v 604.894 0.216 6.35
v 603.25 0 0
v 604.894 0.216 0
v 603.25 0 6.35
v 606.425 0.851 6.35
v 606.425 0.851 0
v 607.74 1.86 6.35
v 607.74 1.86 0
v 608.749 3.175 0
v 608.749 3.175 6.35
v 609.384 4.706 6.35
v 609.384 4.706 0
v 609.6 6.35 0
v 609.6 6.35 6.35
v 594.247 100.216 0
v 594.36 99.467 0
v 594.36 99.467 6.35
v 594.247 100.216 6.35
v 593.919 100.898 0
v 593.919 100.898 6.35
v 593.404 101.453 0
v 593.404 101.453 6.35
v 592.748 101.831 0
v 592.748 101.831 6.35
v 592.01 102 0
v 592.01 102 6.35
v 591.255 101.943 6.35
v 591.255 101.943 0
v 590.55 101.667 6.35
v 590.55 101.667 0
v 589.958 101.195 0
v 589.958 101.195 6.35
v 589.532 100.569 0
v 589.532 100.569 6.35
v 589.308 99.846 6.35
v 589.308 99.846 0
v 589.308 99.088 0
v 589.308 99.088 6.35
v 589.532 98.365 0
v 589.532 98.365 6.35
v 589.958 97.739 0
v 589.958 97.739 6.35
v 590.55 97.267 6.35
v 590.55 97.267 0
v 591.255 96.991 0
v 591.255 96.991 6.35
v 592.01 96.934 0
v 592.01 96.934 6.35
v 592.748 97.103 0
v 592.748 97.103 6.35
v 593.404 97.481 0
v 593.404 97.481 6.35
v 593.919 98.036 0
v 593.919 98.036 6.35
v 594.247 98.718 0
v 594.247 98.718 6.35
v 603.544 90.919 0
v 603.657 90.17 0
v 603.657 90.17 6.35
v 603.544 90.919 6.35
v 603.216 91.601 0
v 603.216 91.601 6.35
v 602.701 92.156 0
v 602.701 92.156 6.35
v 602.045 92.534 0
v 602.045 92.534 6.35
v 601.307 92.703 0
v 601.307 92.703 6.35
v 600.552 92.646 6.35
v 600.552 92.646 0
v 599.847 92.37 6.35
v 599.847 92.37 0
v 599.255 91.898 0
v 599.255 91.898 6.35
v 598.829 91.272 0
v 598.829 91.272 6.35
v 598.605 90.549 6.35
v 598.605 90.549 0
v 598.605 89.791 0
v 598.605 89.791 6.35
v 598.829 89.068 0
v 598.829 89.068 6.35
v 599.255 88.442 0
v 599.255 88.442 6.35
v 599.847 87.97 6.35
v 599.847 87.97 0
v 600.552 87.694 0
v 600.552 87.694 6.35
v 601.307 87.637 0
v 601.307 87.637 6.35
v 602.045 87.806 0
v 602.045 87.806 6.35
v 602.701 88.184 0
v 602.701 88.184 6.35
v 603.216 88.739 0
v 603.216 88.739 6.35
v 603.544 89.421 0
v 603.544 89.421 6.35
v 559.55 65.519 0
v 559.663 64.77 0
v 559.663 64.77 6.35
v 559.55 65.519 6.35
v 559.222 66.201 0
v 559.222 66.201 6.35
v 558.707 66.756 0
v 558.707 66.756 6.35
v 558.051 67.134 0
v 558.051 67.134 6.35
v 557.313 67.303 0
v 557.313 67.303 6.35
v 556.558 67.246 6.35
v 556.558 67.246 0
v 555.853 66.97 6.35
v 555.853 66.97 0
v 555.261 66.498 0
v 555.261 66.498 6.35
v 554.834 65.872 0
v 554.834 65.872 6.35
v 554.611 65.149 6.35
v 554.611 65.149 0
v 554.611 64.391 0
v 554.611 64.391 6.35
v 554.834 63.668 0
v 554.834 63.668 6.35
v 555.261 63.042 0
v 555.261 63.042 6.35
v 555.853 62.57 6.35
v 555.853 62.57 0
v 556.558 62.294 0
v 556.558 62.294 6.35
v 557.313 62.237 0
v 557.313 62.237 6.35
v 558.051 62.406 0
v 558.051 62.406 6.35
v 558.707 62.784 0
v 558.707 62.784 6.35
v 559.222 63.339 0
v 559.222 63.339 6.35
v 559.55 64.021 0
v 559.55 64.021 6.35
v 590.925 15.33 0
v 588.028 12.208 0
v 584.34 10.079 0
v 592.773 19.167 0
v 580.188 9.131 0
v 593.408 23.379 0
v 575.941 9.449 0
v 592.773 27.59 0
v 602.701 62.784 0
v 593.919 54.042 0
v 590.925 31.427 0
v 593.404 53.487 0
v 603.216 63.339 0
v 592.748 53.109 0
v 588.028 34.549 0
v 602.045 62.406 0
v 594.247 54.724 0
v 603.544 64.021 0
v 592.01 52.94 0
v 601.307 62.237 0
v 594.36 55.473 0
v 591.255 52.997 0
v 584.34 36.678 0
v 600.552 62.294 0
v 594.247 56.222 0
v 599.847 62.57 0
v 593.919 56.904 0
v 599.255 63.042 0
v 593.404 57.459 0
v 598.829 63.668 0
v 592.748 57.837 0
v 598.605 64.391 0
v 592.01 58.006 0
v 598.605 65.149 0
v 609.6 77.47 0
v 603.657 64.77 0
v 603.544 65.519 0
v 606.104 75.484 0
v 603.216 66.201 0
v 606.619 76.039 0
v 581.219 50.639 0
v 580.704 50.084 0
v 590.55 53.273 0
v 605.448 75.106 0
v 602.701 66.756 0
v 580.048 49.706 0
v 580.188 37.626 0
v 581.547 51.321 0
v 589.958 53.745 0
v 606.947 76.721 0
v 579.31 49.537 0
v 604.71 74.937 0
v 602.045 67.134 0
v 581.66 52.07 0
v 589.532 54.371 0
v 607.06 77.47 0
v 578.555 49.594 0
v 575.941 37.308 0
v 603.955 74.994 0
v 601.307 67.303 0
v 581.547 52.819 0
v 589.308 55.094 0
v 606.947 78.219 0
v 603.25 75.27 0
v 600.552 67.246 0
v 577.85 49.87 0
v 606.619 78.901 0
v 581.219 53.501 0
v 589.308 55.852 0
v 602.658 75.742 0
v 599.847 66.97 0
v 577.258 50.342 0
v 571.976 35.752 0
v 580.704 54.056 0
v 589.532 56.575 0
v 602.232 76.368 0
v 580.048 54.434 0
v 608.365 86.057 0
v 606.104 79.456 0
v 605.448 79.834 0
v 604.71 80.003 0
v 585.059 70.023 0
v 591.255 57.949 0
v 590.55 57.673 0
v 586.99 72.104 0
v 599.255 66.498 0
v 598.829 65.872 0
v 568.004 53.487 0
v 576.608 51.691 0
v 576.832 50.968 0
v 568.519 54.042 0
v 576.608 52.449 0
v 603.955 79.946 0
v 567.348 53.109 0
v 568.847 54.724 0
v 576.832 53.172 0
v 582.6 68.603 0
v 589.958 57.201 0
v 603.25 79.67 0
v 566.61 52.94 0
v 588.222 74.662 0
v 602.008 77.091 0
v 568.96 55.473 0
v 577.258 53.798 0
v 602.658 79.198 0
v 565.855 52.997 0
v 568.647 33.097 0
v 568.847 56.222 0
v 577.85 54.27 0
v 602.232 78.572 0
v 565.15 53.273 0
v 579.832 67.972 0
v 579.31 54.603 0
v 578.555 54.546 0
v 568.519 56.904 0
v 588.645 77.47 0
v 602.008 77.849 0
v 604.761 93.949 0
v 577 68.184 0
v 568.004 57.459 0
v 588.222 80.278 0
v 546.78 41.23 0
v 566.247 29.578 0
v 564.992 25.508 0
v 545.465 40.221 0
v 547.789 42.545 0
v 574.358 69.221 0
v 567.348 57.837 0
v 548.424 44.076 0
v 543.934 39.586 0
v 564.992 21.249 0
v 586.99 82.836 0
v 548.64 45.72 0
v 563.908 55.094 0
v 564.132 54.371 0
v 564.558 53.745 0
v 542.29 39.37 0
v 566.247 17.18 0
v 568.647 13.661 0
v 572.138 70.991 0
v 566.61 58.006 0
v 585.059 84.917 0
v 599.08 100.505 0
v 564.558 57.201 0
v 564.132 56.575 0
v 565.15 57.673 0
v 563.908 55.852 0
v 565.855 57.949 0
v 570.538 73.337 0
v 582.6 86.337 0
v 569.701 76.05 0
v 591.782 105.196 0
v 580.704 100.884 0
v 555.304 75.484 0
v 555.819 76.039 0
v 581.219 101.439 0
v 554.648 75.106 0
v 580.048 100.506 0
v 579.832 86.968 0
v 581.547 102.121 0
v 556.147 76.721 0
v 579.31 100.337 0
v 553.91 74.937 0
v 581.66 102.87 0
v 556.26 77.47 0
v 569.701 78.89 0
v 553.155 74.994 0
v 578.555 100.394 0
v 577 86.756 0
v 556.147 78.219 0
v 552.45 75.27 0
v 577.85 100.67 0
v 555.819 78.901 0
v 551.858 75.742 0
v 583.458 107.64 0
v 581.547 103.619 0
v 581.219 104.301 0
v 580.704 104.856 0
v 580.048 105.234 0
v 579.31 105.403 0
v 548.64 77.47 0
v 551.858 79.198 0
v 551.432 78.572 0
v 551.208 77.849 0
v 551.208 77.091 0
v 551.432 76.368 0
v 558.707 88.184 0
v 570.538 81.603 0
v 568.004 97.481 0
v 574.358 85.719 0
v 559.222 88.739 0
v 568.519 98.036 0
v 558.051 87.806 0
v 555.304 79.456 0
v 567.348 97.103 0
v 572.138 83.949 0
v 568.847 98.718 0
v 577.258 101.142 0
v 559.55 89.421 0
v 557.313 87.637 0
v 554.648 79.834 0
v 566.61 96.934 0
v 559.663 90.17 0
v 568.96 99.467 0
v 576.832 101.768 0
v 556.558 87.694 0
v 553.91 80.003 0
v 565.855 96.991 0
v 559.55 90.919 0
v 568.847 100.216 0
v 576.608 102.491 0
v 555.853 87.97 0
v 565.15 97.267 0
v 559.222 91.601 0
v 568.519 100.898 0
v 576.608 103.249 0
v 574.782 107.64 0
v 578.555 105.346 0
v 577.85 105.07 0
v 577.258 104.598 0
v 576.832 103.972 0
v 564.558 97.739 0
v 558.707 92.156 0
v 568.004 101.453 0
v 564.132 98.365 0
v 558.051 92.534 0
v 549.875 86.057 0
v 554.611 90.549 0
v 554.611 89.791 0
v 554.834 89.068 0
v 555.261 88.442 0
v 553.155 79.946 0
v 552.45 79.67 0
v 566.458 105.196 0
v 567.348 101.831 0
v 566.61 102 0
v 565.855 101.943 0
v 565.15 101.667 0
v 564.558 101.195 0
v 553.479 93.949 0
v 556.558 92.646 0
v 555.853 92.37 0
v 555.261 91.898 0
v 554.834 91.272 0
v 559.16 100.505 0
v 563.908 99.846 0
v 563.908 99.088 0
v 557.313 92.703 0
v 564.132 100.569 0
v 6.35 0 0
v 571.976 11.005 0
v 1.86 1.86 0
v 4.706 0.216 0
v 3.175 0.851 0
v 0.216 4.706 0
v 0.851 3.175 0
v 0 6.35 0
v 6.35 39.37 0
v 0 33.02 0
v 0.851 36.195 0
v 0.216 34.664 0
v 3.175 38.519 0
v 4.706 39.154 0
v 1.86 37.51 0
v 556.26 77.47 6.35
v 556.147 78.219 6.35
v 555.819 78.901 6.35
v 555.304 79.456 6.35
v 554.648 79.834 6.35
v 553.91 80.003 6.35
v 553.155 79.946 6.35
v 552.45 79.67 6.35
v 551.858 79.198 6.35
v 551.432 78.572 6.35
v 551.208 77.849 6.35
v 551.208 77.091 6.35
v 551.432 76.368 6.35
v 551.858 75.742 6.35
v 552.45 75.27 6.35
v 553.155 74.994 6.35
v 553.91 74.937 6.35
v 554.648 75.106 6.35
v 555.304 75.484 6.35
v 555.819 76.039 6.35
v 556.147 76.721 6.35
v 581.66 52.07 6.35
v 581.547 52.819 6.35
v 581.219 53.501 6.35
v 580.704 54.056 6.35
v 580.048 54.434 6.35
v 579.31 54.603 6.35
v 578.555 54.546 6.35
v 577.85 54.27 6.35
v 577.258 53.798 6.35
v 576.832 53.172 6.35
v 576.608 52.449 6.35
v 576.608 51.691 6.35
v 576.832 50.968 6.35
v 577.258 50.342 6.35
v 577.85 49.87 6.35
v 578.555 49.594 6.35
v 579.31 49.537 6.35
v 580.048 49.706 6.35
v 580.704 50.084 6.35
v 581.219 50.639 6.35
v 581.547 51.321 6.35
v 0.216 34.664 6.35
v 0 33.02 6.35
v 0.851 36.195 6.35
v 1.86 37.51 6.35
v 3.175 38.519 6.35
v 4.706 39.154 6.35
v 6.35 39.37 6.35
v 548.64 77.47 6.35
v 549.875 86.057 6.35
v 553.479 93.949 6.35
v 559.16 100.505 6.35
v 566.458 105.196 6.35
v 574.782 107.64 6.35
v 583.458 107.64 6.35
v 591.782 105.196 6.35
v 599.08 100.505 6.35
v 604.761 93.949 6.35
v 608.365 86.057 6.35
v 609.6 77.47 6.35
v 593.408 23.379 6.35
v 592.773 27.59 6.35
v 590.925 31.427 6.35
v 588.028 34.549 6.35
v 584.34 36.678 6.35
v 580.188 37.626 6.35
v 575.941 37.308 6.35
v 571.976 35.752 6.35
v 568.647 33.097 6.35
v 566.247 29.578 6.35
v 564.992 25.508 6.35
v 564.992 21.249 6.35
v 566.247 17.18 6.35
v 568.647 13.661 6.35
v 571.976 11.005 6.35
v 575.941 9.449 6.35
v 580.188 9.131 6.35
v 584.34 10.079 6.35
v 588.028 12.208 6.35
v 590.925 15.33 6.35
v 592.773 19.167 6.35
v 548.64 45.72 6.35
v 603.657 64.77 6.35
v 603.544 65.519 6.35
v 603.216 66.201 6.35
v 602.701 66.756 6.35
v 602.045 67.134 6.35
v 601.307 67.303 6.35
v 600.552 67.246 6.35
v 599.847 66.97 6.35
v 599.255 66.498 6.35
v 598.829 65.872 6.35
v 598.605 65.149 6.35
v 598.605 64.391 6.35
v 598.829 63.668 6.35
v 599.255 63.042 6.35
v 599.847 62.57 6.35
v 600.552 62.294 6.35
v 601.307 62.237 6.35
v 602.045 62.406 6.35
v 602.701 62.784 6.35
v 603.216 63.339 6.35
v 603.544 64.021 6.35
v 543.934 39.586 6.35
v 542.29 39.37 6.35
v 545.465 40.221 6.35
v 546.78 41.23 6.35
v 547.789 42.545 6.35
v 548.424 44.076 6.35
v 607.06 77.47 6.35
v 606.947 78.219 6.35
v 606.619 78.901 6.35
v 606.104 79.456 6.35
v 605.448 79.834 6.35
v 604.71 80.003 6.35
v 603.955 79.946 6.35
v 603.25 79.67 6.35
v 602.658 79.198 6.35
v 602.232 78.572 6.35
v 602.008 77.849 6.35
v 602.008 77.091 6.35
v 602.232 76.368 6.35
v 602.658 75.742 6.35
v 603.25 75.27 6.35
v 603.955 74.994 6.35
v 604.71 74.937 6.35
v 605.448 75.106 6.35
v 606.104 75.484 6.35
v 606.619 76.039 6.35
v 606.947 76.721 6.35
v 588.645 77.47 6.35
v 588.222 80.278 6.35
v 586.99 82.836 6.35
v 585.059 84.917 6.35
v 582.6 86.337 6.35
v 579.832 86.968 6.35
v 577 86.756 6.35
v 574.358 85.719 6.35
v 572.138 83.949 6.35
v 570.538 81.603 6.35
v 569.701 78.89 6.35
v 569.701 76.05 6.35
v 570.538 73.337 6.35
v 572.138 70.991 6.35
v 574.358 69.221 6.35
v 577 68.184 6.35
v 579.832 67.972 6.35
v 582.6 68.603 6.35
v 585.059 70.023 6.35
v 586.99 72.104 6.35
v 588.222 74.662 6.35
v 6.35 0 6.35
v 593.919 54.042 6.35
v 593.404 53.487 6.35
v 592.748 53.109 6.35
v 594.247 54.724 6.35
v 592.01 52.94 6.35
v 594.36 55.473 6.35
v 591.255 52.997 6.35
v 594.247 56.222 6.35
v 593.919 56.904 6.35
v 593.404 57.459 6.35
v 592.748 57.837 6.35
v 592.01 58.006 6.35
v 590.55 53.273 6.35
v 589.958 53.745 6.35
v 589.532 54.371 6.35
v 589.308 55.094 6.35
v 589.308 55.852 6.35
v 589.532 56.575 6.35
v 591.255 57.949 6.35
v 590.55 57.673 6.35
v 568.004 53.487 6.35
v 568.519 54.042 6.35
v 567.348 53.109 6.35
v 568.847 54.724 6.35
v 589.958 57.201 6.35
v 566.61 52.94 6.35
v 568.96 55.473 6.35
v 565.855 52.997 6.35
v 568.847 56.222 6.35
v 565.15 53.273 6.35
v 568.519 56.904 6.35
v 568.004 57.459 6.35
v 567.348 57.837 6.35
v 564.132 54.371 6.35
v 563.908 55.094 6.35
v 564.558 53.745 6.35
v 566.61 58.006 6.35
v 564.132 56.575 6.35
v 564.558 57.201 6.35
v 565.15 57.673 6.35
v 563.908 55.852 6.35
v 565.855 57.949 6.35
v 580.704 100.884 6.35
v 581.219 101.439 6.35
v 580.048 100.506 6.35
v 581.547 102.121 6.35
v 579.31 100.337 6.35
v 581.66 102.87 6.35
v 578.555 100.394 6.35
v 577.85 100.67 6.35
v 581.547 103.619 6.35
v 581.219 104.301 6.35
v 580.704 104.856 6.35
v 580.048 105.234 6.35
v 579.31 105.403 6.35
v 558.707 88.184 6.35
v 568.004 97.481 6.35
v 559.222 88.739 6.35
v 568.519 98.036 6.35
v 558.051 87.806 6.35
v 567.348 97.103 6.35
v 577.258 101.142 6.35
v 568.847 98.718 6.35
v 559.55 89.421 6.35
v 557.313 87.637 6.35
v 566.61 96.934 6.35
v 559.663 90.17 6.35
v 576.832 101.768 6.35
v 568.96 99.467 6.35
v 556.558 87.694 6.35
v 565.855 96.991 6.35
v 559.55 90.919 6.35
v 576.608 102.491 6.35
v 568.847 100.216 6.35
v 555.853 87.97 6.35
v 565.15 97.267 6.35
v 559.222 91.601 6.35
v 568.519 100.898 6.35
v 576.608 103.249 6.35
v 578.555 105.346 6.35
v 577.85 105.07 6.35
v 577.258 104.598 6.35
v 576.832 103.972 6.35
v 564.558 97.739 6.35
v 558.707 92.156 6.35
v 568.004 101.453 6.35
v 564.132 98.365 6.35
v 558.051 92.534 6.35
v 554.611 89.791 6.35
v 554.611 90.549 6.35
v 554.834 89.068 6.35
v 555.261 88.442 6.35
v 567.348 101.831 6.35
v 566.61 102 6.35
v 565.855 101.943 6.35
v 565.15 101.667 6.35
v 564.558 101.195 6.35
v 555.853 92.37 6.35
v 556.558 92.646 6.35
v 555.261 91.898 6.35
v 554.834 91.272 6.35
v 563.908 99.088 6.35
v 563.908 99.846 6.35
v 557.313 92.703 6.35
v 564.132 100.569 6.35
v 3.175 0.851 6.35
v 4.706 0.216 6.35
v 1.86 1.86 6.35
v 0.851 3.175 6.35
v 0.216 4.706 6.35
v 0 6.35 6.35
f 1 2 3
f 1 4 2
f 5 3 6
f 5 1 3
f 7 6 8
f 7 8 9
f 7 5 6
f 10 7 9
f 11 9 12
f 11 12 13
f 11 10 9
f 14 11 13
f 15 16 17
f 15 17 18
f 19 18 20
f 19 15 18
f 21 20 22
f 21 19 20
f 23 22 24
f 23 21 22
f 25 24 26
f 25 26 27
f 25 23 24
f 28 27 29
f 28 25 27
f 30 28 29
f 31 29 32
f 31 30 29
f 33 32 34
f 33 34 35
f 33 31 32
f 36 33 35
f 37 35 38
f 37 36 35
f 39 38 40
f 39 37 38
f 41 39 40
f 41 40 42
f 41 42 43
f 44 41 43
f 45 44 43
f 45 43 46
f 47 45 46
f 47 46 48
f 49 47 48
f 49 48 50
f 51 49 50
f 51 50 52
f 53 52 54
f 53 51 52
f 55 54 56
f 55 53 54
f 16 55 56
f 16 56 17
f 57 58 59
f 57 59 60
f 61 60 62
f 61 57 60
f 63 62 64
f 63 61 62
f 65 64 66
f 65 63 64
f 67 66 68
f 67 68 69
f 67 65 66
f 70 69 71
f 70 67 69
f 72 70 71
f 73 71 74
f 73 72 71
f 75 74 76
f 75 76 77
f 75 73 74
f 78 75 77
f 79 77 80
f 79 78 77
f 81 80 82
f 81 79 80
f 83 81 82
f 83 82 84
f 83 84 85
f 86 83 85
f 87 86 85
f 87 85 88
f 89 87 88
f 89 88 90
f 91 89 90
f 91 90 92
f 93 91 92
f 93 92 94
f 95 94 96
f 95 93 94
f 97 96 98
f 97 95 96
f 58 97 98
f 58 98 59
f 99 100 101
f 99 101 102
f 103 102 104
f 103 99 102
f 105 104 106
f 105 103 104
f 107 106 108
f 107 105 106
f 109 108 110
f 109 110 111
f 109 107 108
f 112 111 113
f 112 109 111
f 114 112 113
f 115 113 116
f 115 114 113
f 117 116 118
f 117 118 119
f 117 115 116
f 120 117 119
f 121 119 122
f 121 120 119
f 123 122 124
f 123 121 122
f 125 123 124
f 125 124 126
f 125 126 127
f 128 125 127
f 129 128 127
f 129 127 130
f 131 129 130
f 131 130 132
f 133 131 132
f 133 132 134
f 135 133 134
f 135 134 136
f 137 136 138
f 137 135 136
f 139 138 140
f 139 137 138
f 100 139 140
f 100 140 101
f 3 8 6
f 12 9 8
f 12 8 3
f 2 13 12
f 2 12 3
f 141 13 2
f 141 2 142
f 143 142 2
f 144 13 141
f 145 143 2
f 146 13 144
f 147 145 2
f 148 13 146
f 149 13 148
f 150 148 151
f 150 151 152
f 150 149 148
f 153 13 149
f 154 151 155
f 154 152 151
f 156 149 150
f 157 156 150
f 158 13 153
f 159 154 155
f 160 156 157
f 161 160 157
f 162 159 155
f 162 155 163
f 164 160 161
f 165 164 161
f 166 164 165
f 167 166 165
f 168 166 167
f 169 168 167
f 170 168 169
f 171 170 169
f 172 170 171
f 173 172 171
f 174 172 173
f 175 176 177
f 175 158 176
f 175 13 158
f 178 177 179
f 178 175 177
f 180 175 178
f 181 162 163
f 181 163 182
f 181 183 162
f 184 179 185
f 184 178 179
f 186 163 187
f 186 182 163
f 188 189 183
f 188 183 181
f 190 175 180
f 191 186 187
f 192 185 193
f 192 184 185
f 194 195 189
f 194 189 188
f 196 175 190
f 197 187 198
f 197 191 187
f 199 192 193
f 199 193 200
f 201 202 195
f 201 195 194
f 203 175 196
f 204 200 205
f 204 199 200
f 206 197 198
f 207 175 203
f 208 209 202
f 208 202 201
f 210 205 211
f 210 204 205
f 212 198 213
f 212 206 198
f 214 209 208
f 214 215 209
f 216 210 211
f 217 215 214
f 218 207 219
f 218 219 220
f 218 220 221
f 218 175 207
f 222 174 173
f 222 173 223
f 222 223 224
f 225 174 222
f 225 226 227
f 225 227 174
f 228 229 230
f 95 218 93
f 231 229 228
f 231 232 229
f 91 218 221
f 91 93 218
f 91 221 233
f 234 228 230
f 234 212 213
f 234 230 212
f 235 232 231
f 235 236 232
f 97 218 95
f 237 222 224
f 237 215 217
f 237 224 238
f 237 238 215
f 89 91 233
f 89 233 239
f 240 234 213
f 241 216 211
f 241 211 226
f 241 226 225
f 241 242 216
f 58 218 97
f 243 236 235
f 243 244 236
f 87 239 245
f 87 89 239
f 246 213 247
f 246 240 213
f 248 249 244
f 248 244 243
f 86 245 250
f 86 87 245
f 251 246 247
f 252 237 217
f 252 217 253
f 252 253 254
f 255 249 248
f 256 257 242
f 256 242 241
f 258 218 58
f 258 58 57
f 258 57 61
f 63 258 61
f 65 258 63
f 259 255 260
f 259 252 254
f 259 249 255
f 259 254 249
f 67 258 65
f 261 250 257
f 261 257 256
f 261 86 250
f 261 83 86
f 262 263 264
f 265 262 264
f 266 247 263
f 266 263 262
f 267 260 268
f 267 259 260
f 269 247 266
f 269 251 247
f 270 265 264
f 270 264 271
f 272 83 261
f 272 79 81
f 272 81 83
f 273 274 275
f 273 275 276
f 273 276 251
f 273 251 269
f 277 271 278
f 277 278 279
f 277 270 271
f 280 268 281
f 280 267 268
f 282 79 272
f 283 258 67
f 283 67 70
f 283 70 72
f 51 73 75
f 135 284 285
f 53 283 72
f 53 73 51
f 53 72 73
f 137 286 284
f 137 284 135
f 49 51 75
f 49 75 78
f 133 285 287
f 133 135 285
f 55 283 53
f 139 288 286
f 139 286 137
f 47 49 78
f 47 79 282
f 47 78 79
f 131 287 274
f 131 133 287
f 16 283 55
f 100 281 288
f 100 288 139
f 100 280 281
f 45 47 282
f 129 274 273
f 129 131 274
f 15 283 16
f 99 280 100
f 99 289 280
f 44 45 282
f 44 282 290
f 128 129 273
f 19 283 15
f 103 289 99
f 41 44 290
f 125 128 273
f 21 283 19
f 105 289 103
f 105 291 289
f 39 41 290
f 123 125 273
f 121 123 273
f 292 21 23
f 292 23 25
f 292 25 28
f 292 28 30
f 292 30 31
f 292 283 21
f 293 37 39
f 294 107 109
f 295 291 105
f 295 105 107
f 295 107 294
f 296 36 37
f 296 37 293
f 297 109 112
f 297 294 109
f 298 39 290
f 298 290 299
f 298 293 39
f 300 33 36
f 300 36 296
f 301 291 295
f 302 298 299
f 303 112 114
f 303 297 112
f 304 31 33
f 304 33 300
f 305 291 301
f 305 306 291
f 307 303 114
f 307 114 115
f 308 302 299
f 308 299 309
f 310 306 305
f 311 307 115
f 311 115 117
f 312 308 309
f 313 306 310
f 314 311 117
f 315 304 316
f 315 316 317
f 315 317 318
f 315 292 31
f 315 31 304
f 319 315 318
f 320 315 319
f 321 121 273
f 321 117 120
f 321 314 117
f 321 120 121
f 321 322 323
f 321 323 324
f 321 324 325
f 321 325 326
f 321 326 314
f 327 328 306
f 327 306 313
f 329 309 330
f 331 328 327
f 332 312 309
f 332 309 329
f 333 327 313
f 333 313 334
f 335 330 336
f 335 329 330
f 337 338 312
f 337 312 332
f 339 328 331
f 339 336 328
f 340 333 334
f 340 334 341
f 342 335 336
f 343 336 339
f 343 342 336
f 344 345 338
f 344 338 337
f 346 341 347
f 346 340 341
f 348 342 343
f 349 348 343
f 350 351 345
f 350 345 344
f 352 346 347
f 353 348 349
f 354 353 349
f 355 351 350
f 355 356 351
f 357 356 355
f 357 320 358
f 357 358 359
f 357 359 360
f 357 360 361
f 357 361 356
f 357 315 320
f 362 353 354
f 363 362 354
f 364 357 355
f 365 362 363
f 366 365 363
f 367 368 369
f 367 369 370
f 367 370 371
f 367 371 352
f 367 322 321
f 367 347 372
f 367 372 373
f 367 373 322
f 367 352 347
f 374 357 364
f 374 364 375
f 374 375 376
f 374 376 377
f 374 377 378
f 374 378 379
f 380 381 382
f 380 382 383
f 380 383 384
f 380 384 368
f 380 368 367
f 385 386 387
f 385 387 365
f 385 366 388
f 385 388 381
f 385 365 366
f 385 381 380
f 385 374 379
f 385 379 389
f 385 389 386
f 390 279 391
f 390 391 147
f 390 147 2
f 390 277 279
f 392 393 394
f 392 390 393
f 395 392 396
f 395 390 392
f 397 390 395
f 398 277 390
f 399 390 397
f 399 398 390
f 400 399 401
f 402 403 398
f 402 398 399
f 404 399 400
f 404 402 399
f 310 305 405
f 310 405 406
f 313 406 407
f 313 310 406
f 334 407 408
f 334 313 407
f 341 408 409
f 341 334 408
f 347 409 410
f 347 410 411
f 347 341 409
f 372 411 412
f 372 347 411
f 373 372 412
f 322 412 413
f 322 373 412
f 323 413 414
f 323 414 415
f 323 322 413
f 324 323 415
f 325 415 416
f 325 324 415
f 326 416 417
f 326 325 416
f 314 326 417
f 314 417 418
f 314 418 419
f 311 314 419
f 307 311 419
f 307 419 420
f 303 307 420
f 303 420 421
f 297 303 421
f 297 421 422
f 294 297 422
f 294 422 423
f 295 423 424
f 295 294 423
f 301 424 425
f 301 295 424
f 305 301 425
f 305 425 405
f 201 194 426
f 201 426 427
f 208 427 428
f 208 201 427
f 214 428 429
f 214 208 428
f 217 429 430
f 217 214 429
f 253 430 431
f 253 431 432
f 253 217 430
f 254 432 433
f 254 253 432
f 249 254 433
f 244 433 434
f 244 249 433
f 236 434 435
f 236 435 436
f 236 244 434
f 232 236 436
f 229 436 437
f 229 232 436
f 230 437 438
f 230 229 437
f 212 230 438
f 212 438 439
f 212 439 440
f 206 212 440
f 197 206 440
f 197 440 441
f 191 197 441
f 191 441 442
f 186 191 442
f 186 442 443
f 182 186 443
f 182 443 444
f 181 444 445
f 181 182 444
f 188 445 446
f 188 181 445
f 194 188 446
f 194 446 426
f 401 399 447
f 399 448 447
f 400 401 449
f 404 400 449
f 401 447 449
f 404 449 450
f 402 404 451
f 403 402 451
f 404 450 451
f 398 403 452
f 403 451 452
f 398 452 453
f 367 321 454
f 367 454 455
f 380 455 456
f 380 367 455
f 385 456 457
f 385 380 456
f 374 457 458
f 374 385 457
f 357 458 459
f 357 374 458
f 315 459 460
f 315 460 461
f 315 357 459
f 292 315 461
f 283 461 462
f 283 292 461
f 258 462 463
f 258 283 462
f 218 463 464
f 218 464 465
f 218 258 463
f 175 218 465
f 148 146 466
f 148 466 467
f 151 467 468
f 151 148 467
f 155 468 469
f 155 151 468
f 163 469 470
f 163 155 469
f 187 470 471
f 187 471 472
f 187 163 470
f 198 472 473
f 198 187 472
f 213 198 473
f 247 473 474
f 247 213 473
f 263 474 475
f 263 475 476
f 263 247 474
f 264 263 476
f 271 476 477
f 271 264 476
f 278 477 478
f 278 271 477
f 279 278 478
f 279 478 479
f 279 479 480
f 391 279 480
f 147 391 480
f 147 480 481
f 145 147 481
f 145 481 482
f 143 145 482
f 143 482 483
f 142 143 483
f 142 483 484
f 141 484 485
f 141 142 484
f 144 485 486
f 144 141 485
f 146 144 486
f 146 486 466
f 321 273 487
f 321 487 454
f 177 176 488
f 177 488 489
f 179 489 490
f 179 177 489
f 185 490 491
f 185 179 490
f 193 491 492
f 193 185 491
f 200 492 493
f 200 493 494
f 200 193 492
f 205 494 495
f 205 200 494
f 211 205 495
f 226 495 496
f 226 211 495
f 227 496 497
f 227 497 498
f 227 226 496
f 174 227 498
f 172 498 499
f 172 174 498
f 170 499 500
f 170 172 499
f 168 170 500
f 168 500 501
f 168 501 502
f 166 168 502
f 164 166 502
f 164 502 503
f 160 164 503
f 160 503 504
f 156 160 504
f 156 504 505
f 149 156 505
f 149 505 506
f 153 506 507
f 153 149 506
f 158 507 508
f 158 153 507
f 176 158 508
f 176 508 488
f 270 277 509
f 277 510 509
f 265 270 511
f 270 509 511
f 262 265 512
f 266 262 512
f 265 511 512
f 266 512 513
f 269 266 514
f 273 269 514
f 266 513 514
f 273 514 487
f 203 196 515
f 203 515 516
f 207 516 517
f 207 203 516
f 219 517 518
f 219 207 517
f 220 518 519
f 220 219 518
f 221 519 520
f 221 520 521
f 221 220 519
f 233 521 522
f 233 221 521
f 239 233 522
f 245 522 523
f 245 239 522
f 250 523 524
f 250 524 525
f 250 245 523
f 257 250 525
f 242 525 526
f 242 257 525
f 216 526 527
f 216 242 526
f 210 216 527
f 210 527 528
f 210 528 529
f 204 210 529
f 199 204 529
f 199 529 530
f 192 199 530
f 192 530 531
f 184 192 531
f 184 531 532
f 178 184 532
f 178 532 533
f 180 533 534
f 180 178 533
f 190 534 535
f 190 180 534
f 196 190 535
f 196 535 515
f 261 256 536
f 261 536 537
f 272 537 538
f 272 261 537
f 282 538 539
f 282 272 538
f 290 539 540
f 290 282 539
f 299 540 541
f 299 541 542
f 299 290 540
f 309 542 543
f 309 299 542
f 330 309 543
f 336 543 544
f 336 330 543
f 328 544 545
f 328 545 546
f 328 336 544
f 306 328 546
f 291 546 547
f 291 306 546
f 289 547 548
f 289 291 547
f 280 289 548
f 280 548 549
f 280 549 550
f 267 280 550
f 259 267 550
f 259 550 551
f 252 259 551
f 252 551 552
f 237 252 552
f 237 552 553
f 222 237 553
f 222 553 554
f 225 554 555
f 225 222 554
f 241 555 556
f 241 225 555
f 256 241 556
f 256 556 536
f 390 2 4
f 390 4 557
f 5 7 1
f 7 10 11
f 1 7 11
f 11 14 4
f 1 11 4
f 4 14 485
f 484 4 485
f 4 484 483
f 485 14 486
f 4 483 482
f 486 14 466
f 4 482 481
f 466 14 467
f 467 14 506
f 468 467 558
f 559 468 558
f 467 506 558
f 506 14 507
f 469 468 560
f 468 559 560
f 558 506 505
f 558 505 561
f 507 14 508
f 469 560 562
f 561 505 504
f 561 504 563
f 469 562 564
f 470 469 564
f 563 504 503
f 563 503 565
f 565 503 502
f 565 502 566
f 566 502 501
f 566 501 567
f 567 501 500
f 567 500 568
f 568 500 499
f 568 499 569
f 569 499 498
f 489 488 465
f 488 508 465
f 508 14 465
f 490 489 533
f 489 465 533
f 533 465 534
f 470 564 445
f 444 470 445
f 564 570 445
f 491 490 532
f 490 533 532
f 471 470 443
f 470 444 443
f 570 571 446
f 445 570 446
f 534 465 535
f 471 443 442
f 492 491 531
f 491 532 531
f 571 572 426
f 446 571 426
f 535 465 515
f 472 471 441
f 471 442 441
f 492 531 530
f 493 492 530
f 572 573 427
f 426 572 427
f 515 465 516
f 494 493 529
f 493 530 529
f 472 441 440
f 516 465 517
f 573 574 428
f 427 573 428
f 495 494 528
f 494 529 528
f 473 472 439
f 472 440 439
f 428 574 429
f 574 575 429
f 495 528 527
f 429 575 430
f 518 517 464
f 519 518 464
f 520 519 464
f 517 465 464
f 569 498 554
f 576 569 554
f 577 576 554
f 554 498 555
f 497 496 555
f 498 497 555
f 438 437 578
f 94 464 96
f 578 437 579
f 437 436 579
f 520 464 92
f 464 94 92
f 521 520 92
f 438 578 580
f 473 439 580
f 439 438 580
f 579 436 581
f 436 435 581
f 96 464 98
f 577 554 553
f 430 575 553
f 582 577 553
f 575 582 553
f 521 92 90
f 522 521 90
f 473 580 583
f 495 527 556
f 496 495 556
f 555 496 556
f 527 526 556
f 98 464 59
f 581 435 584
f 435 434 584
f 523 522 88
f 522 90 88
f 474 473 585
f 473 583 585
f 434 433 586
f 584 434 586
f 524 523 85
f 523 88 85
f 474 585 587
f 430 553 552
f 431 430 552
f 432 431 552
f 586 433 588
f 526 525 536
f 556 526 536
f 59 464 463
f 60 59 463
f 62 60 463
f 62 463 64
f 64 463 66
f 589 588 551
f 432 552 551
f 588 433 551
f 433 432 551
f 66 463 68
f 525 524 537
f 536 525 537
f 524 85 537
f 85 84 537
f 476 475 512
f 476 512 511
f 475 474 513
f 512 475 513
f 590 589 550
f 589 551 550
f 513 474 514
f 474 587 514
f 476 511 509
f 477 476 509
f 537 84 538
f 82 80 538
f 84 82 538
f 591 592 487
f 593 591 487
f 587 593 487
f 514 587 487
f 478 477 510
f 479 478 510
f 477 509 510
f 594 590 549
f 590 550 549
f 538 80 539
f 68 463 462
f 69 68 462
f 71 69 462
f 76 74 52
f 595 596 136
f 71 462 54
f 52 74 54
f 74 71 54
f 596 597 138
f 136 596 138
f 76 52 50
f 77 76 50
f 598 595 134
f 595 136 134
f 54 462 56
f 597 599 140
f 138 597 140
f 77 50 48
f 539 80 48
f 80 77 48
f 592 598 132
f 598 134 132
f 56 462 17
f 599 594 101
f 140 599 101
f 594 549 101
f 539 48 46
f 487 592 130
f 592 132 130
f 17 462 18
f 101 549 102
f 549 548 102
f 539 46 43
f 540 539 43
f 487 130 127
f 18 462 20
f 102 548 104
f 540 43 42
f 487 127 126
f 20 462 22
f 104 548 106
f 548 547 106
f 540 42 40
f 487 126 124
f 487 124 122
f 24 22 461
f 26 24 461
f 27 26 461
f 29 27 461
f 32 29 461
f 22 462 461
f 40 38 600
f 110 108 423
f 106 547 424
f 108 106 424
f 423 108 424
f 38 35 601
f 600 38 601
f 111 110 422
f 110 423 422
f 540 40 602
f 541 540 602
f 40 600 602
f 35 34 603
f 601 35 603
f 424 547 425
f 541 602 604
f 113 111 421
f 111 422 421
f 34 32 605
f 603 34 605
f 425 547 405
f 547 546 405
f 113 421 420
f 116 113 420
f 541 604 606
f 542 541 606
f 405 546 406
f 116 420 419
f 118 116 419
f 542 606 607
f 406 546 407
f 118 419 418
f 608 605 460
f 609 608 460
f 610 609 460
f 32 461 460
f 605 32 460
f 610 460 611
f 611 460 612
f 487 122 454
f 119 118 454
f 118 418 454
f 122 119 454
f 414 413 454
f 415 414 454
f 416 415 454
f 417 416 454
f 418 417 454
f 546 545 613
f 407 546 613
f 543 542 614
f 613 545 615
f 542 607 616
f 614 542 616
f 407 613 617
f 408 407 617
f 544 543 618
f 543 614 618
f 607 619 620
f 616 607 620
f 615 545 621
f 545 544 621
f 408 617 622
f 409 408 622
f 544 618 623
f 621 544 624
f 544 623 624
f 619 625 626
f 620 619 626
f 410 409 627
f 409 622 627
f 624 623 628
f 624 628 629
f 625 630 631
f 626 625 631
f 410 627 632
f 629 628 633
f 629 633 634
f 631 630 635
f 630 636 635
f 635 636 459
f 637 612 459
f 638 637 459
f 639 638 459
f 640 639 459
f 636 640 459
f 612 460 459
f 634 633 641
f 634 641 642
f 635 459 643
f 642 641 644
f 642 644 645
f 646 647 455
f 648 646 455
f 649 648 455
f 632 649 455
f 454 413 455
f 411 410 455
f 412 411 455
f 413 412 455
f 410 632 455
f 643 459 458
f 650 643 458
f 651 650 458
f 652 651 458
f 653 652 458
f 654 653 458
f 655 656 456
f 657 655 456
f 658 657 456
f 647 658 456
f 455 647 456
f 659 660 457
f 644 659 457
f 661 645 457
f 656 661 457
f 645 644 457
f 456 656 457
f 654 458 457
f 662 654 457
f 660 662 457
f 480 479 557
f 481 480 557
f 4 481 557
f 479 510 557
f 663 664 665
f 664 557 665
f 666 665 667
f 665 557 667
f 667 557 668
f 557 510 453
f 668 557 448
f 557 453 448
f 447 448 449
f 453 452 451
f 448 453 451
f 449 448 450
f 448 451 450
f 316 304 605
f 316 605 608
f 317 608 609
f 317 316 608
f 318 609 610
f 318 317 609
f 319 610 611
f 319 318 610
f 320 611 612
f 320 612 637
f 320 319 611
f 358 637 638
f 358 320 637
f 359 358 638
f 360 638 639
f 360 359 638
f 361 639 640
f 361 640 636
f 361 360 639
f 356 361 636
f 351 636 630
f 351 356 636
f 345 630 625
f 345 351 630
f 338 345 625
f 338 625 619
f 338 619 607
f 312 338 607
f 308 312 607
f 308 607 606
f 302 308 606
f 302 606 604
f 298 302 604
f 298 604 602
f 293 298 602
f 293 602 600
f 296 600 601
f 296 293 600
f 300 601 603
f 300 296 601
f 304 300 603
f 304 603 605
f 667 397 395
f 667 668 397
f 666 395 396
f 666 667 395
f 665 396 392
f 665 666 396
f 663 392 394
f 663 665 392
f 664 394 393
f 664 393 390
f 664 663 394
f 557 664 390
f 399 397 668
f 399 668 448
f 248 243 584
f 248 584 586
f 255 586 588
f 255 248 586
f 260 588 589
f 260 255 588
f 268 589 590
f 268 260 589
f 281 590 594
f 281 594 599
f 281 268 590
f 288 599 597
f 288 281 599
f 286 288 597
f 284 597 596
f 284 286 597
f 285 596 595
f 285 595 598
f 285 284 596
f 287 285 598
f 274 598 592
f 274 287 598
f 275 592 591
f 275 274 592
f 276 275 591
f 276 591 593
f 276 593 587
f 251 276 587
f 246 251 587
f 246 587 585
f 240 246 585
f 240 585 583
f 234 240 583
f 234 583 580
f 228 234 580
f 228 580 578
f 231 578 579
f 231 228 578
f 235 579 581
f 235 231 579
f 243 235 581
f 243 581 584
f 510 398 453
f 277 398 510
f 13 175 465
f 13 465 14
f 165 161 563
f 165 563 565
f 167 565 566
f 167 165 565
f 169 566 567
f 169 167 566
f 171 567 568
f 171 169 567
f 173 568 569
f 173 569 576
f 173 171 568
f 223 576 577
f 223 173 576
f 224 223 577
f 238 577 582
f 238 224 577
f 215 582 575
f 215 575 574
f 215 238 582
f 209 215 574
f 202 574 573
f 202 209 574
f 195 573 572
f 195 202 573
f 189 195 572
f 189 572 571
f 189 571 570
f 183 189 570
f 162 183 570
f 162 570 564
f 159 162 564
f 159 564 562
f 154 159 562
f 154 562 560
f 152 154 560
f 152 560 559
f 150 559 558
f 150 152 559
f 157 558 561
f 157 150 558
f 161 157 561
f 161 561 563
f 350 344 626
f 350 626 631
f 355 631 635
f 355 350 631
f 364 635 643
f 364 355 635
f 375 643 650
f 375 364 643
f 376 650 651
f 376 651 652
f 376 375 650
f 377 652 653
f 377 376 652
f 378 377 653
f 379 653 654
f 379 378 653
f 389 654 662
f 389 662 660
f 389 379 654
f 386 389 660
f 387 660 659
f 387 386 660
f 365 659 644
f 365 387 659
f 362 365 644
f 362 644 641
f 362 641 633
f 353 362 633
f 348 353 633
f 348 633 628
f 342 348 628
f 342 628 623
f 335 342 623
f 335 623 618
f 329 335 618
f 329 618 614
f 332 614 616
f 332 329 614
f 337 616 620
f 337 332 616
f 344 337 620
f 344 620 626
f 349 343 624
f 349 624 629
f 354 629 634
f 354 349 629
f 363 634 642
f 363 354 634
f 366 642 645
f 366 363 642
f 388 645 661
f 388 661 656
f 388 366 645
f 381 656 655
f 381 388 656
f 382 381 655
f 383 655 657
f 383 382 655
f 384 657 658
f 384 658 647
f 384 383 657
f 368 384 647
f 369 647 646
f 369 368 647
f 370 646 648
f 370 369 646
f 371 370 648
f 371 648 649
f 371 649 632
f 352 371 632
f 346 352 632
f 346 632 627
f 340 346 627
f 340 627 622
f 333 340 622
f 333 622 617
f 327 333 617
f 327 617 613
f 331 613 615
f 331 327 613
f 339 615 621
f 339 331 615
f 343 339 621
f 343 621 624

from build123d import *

# Parameters (mm, degrees)
SKETCH1_R           = 9.525
SKETCH1_R_2         = 2.54
SKETCH1_R_3         = 14.2875
BOSS_EXTRUDE1_DEPTH = 6.35
FILLET2_R           = 6.35


with BuildPart() as part:
    # Sketch1 → Boss-Extrude1 (new body)
    with BuildSketch(Plane.XY):
        with BuildLine():
            Line((0, 0), (0, 39.37))
            Line((0, 39.37), (40.53078, 39.37))
            Line((40.53078, 39.37), (548.64, 39.37))
            Line((548.64, 39.37), (548.64, 77.47))
            ThreePointArc((548.64, 77.47), (579.12, 107.95), (609.6, 77.47))
            Line((609.6, 77.47), (609.6, 0))
            Line((609.6, 0), (0, 0))
        make_face()
        with Locations((579.12, 77.47)):
            Circle(SKETCH1_R, mode=Mode.SUBTRACT)
        with Locations((579.12, 102.87)):
            Circle(SKETCH1_R_2, mode=Mode.SUBTRACT)
        with Locations((591.82, 99.467045256)):
            Circle(SKETCH1_R_2, mode=Mode.SUBTRACT)
        with Locations((601.117045256, 90.17)):
            Circle(SKETCH1_R_2, mode=Mode.SUBTRACT)
        with Locations((604.52, 77.47)):
            Circle(SKETCH1_R_2, mode=Mode.SUBTRACT)
        with Locations((601.117045256, 64.77)):
            Circle(SKETCH1_R_2, mode=Mode.SUBTRACT)
        with Locations((591.82, 55.472954744)):
            Circle(SKETCH1_R_2, mode=Mode.SUBTRACT)
        with Locations((579.12, 52.07)):
            Circle(SKETCH1_R_2, mode=Mode.SUBTRACT)
        with Locations((566.42, 55.472954744)):
            Circle(SKETCH1_R_2, mode=Mode.SUBTRACT)
        with Locations((557.122954744, 64.77)):
            Circle(SKETCH1_R_2, mode=Mode.SUBTRACT)
        with Locations((553.72, 77.47)):
            Circle(SKETCH1_R_2, mode=Mode.SUBTRACT)
        with Locations((557.122954744, 90.17)):
            Circle(SKETCH1_R_2, mode=Mode.SUBTRACT)
        with Locations((566.42, 99.467045256)):
            Circle(SKETCH1_R_2, mode=Mode.SUBTRACT)
        with Locations((579.12, 23.378627903)):
            Circle(SKETCH1_R_3, mode=Mode.SUBTRACT)
    extrude(amount=BOSS_EXTRUDE1_DEPTH)

    # Fillet2
    fillet2_edges = [part.edges().sort_by_distance(p)[0] for p in [
        (609.6, 0, 3.175),
        (0, 0, 3.175),
        (0, 39.37, 3.175),
        (548.64, 39.37, 3.175),
    ]]
    fillet(fillet2_edges, radius=FILLET2_R)


solid = part.part
